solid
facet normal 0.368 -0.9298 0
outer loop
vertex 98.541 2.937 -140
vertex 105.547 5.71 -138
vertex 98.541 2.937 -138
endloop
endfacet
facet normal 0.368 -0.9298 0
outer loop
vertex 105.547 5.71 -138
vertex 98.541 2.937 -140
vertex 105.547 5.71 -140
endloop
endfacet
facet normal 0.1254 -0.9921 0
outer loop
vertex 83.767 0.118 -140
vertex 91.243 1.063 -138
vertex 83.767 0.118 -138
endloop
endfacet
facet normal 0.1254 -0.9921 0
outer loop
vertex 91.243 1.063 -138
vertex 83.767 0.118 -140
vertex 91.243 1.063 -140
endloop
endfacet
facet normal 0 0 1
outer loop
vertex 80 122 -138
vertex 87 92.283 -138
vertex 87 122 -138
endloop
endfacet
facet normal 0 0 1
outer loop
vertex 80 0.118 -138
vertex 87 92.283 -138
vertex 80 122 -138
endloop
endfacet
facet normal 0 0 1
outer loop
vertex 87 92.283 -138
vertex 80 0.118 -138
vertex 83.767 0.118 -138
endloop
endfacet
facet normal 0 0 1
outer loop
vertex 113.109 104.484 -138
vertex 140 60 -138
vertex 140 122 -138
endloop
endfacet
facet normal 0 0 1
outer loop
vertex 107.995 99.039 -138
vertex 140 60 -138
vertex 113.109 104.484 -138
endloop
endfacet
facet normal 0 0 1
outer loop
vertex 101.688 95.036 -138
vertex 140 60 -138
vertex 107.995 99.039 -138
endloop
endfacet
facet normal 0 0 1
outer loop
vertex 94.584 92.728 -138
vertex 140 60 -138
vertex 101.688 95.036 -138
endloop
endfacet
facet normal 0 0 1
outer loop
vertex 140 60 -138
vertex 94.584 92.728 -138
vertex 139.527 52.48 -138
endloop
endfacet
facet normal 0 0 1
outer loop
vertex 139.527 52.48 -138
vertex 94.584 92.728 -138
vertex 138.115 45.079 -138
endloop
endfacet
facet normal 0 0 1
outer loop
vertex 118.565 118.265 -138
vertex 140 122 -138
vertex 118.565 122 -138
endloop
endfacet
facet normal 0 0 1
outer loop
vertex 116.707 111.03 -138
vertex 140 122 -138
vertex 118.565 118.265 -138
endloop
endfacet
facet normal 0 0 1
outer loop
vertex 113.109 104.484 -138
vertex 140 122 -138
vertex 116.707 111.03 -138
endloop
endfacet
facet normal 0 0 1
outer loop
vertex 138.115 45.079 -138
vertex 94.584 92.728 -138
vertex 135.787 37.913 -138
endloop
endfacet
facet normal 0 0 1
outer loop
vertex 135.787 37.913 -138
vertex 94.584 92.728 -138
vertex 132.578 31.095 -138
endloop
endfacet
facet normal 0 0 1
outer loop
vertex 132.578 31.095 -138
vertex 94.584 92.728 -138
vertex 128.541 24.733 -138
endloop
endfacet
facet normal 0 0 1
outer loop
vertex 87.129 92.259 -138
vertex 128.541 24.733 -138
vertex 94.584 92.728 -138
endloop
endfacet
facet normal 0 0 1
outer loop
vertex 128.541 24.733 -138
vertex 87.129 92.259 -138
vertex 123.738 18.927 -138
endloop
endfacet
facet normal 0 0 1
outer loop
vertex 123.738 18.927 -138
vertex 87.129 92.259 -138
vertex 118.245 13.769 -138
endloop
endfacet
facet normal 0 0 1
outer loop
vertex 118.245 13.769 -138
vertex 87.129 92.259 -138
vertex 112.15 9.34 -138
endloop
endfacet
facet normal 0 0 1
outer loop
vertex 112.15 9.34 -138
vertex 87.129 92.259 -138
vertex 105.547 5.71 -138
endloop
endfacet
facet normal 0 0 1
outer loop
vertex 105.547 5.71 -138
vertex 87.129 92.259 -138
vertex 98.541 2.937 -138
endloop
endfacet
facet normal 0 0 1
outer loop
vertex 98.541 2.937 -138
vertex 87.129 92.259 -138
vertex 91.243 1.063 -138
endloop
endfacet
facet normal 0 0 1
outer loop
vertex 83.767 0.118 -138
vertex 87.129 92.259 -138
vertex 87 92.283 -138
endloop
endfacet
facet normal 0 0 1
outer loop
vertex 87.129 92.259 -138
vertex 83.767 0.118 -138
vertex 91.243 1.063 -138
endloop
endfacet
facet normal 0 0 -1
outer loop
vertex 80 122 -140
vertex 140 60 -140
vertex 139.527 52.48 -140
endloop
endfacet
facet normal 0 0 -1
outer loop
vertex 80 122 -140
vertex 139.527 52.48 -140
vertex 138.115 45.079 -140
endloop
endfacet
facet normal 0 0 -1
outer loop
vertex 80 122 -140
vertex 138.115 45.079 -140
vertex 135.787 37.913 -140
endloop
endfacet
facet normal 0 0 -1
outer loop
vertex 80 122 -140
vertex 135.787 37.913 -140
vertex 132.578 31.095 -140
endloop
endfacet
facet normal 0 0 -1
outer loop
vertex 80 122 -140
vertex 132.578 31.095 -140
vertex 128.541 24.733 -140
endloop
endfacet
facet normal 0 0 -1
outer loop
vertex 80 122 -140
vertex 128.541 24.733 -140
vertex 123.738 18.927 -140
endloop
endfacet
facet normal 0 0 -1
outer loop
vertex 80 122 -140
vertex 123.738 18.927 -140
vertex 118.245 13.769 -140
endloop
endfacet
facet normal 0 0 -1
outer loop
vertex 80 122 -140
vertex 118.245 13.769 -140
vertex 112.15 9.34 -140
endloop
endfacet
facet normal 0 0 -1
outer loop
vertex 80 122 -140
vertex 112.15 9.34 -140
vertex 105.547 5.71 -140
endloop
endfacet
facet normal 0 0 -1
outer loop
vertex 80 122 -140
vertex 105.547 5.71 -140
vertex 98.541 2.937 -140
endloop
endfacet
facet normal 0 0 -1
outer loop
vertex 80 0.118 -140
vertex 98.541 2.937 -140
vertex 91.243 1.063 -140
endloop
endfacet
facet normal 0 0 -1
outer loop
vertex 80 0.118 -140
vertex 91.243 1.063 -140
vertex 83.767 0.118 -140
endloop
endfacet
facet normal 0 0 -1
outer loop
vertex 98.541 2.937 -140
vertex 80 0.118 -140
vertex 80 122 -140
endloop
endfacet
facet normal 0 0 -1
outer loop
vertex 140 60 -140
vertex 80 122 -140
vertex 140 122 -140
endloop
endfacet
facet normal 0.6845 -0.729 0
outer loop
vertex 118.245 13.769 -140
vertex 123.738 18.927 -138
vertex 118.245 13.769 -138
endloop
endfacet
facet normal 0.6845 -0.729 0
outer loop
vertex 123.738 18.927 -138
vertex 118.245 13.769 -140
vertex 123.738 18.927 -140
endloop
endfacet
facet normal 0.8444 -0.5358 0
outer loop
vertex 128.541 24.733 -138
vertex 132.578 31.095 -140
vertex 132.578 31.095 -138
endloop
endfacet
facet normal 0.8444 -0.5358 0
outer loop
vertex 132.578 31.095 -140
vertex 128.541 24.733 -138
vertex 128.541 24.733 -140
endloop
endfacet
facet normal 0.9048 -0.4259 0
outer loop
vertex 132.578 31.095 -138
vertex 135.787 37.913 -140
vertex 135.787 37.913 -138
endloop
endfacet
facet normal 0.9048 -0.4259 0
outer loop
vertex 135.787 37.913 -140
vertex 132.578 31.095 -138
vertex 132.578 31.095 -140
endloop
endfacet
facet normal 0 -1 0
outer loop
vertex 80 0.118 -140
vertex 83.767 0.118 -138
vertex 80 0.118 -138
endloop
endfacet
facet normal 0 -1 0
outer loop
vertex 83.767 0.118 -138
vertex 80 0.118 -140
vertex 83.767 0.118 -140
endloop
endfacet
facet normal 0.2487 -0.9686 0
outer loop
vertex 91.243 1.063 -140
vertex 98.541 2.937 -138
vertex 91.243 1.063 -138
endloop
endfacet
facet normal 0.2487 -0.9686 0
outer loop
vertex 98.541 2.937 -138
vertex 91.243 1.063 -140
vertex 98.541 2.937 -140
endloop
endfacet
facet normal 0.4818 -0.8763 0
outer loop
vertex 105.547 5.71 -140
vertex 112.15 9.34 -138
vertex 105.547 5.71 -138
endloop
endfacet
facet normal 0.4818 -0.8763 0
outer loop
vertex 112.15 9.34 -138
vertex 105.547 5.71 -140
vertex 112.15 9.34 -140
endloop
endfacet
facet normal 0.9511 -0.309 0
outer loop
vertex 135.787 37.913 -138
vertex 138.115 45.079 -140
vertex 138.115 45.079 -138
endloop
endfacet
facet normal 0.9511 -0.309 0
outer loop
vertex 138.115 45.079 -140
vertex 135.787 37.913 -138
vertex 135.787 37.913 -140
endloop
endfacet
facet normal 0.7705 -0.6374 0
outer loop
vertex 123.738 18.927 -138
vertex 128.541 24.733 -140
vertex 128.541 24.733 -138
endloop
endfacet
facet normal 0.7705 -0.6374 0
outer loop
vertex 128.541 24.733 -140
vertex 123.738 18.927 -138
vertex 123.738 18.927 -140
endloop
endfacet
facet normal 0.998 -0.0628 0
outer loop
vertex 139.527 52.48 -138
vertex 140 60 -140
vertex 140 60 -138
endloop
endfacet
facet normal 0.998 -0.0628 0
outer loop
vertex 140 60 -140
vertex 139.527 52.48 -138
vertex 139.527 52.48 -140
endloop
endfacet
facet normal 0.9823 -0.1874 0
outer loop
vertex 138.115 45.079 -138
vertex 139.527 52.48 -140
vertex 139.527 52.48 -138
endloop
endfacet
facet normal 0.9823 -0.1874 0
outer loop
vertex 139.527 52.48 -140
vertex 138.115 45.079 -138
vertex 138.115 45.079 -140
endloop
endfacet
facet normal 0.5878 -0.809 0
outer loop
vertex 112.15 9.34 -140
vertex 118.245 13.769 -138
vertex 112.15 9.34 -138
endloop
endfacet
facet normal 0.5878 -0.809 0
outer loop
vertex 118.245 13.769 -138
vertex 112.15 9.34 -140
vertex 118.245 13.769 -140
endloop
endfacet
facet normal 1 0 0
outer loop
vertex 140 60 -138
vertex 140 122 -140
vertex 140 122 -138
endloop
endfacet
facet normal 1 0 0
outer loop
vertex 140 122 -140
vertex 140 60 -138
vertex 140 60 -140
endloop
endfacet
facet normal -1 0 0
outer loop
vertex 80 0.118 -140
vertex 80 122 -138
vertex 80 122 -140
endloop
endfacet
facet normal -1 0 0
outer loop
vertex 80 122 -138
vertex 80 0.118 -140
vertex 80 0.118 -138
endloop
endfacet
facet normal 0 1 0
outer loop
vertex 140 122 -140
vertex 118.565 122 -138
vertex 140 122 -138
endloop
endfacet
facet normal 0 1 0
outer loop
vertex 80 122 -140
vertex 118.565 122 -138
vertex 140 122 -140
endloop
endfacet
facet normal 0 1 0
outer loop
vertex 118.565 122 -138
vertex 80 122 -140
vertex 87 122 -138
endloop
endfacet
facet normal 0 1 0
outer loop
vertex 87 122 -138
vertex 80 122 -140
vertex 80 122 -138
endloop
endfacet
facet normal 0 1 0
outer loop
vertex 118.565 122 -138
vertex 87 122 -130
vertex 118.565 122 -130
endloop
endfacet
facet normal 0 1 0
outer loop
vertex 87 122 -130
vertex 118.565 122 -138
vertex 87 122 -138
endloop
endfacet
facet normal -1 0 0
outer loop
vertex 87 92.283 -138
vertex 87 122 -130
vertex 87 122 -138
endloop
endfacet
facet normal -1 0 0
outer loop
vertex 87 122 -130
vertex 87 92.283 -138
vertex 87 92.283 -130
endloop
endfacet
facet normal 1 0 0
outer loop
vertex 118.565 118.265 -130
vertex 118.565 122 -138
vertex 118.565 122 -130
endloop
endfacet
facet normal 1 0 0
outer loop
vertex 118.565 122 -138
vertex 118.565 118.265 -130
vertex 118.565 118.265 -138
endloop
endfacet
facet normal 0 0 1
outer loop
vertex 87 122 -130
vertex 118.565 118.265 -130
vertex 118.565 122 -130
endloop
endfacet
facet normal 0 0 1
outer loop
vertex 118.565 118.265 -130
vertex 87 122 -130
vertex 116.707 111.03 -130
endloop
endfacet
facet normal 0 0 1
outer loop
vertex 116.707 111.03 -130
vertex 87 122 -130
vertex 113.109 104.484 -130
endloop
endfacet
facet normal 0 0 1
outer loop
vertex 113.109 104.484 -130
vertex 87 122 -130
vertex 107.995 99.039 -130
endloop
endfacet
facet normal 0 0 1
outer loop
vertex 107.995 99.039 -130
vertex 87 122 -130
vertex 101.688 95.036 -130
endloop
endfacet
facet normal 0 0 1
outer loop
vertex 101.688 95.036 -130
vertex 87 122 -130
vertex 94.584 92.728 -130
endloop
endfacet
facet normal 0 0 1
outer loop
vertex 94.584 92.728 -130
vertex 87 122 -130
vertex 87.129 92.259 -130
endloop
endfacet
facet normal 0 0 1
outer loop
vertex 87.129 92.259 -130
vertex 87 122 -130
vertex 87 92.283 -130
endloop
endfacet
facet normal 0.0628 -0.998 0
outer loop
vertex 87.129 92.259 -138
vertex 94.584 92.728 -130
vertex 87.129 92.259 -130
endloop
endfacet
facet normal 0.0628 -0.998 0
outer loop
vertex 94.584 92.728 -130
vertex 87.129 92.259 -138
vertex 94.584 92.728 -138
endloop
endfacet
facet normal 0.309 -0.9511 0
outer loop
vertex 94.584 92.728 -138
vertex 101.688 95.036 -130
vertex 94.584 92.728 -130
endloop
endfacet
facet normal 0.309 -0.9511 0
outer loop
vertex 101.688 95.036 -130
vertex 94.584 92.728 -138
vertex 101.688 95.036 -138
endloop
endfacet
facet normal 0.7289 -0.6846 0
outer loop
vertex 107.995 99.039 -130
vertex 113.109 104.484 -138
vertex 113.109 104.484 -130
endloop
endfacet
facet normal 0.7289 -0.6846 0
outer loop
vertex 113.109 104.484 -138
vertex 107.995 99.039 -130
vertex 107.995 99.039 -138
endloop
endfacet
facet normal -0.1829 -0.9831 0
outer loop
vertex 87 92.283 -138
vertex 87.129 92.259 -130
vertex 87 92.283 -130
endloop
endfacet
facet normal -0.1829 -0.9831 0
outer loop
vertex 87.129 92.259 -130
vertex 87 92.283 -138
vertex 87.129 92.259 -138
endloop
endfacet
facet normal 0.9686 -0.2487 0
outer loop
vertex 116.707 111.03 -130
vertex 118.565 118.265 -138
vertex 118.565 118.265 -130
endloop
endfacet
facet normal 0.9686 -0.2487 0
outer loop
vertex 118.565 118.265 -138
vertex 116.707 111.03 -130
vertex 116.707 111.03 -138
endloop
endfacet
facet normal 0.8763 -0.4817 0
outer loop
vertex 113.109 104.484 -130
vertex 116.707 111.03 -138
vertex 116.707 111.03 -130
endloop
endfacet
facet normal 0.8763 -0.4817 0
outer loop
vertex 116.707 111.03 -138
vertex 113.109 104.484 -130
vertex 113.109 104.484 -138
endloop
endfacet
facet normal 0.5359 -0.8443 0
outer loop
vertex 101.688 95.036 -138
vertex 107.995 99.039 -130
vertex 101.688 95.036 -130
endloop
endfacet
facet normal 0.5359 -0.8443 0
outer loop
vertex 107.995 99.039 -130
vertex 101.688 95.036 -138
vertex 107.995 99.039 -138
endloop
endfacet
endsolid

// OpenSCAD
rotate(a=90,v=[0,1,0]) {
difference() {
    union() {
        translate([138,60,80])
        rotate(a=90,v=[0,1,0]) {
            cylinder(r=60,h=2,$fn=50); // front
        }
        translate([138,60,80])
        cube([2,65,60]);  // front2
    }
    
    union() {
        translate([20,0,20])
        cube([195,260,60]); // inside bottom
        
        translate([20,10,60])
        cube([113,130,27]); // inside printer
        translate([20,140,60])
        cube([195,130,61]); // inside lcd
        
        translate([45,266,20])
        cube([145,25,101]); // inside back lid
        translate([45,266,10])
        cube([145,10,11]);  // inside bottom lid
        
        translate([140,-1,-1])
        cube([96,292,142]);
        translate([-1,122,-1])
        cube([141,169,142]);
        
        translate([125,10,60])
        cube([9,131,27]);   // 133+7,10+130,60+27
        
        translate([135,50,6.9])
        cube([6,20,6.2]);    // in
    }
}

difference() {
    union() {
        translate([130,122,89])
        rotate(a=90,v=[0,1,0]) {
            cylinder(r=29.8,h=9,$fn=25);
        }
    }
    
    union() {
        translate([20,10,20])
        cube([195,260,40]); // inside bottom
        
        translate([20,10,60])
        cube([113,130,27]); // inside printer
        translate([20,140,60])
        cube([195,130,61]); // inside lcd
        
        translate([45,266,20])
        cube([145,25,101]); // inside back lid
        translate([45,266,10])
        cube([145,10,11]);  // inside bottom lid
        
        translate([140,-1,-1])
        cube([96,292,142]);
        translate([-1,122,-1])
        cube([141,169,142]);
        
        translate([132,10,60])
        cube([9,131,27]);   // 133+7,10+130,60+27
        
        translate([135,50,6.9])
        cube([6,20,6.2]);    // in
    }
}
}
